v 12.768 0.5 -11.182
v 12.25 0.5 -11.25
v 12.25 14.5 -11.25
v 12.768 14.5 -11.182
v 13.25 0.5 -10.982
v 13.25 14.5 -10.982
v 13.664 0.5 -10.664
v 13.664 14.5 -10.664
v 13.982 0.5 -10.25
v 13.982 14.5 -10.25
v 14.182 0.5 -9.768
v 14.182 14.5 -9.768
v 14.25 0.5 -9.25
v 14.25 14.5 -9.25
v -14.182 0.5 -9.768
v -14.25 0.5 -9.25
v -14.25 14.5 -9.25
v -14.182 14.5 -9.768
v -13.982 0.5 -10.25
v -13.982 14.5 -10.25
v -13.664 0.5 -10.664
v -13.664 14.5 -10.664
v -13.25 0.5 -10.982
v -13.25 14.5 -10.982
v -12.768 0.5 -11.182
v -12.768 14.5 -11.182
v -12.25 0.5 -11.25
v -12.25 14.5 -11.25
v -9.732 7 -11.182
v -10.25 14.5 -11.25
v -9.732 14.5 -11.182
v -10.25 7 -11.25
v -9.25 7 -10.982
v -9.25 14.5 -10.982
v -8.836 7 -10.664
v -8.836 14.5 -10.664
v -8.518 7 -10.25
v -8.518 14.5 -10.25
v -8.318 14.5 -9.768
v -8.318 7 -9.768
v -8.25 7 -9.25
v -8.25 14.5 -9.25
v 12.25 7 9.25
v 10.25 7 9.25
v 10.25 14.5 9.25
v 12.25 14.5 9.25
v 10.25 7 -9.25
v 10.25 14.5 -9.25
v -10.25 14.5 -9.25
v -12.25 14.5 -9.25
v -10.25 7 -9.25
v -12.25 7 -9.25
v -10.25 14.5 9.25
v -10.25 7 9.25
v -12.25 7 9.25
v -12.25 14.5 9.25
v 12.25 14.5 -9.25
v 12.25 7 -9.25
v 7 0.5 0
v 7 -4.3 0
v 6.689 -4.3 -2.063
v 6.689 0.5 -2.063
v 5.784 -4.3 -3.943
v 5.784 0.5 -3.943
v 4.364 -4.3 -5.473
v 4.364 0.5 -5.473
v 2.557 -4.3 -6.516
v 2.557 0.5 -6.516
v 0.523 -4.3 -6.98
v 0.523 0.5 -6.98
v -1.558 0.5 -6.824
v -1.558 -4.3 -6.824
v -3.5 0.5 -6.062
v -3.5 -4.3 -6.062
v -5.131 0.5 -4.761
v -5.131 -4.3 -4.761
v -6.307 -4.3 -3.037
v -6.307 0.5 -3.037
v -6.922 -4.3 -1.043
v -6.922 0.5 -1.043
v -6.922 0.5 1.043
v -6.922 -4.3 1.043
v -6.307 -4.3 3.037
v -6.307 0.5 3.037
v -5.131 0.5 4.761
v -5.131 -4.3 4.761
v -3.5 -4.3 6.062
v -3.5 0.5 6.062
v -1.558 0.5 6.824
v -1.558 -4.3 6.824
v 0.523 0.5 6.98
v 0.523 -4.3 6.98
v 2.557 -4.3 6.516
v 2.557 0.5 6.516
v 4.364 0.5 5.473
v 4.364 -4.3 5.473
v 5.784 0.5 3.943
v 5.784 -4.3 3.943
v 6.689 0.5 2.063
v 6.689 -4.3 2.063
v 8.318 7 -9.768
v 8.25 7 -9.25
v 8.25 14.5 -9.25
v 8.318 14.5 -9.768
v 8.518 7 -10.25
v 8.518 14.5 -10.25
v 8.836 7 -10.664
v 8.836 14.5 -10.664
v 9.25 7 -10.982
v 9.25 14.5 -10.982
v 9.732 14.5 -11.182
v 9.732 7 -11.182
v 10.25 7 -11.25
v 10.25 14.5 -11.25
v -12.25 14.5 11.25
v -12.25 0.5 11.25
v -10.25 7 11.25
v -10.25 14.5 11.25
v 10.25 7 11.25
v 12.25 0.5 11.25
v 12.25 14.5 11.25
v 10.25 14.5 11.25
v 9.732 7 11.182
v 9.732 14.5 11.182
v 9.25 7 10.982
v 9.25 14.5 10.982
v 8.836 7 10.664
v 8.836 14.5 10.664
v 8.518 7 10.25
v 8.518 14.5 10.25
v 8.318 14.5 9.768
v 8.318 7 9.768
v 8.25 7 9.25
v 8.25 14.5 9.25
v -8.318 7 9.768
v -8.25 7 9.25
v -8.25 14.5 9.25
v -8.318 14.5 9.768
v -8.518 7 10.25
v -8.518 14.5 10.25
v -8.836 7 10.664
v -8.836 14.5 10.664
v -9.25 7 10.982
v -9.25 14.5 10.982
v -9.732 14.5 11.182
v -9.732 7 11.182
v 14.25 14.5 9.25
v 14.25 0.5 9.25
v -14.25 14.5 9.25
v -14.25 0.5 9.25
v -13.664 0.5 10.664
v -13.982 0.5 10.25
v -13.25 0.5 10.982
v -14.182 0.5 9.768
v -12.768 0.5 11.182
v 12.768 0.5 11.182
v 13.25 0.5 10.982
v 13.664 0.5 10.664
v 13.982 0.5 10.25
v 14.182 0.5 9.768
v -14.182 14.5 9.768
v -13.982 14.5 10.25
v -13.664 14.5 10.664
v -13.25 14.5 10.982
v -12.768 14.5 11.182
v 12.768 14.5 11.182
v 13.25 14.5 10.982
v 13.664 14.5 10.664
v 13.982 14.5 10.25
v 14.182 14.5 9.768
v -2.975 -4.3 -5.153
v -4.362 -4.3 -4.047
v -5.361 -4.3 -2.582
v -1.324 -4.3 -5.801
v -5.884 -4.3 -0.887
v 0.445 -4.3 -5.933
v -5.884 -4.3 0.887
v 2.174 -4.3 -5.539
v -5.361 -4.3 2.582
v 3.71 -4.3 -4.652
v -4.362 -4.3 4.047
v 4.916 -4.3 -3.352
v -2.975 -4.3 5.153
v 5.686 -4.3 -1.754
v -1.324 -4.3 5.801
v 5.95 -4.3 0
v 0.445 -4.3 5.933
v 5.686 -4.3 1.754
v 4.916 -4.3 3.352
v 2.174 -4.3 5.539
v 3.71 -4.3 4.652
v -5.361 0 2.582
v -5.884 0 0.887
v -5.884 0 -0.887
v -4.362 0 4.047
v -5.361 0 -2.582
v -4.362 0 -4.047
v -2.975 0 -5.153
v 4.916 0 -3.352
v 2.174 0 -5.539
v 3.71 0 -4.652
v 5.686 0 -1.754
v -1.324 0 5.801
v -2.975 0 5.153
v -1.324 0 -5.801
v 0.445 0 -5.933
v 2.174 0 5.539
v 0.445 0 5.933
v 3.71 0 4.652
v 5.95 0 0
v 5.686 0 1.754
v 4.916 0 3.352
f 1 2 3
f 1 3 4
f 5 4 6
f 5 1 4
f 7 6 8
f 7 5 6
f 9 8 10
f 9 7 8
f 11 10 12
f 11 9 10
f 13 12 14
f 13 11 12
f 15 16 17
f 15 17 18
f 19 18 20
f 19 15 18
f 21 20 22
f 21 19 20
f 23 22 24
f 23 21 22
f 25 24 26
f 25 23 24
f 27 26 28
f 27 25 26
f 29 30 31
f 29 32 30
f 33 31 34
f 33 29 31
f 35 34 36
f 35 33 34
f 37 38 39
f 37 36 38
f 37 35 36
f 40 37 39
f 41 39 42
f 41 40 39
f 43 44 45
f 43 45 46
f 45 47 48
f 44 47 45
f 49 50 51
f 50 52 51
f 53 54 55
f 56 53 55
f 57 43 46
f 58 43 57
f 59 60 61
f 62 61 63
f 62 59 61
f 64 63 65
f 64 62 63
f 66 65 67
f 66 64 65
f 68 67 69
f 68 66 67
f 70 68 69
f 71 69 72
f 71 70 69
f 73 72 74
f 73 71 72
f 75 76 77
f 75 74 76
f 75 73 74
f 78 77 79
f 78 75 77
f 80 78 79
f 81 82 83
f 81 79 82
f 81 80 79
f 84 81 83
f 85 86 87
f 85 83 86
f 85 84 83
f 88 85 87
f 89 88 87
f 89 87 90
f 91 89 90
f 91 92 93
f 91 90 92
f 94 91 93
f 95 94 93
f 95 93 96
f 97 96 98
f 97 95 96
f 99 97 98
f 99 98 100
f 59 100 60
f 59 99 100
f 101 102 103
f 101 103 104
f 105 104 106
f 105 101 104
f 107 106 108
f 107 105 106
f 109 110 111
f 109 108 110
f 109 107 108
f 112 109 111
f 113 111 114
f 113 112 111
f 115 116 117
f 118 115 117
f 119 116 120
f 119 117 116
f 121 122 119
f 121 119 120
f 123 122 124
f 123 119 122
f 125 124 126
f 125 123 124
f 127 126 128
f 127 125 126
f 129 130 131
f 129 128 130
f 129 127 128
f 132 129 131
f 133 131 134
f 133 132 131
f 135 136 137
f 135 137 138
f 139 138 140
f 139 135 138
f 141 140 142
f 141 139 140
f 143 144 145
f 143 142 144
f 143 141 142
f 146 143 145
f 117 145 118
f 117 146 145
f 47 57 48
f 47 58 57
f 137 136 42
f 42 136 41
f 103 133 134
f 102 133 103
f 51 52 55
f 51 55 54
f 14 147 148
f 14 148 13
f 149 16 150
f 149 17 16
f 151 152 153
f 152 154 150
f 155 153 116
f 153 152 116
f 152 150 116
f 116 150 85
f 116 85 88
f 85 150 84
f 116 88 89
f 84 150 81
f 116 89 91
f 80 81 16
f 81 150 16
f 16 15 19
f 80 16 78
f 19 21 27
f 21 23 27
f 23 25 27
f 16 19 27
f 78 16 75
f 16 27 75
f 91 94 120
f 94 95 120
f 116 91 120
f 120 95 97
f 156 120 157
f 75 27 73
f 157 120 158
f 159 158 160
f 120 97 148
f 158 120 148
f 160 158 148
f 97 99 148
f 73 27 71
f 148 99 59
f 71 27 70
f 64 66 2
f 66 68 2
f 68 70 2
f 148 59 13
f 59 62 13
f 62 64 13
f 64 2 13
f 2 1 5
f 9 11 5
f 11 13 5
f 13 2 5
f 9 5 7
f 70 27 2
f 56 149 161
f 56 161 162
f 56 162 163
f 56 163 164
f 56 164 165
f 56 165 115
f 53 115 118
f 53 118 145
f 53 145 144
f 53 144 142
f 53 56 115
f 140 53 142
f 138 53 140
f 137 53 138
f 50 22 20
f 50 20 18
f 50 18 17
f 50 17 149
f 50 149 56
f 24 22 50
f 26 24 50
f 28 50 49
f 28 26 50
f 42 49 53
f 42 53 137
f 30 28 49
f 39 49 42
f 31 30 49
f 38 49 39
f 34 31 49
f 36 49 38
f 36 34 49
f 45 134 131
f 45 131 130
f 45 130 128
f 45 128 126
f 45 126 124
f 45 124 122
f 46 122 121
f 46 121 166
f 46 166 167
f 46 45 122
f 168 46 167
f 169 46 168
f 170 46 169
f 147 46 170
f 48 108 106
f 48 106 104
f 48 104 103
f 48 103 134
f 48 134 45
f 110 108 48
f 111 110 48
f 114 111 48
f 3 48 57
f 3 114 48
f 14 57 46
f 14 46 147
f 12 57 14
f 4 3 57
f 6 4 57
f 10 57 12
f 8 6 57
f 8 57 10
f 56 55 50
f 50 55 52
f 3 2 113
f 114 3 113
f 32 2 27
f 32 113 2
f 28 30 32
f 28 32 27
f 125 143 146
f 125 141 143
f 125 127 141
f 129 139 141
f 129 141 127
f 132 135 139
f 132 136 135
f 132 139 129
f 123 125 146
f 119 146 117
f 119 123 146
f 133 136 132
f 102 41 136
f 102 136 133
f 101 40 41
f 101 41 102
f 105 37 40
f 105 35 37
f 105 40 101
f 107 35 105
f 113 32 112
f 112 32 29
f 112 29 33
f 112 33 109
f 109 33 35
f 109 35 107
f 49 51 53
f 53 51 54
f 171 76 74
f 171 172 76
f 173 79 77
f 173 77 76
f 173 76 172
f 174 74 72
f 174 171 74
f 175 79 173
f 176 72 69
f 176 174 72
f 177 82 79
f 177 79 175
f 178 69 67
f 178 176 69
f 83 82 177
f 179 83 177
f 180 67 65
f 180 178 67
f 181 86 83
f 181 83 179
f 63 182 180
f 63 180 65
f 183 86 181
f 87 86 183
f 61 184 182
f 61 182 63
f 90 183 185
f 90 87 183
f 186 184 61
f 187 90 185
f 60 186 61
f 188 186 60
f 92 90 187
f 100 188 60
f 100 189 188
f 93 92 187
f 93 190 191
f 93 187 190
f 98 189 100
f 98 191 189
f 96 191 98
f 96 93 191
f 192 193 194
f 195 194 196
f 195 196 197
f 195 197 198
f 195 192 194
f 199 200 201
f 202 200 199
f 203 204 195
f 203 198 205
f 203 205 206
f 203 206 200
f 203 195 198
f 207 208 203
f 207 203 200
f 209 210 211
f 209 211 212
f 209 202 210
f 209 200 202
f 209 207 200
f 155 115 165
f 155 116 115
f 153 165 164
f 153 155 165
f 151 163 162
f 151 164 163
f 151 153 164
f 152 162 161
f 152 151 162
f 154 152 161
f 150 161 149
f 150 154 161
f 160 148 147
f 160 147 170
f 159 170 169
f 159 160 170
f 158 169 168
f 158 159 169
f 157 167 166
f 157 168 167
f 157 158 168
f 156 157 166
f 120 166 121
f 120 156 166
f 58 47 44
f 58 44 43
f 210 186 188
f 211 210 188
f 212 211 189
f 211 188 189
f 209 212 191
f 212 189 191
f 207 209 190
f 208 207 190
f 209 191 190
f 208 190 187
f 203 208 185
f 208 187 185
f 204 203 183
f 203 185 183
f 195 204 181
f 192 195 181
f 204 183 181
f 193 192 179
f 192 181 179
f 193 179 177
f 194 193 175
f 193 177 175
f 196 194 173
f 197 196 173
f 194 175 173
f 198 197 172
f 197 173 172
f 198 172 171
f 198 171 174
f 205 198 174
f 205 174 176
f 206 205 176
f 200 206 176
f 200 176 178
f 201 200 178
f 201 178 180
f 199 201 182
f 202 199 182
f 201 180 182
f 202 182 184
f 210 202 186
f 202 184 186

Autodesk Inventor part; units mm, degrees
ref_plane "YZ Plane" through (0, 0, 0) normal (1, 0, 0) x (0, 1, 0)
ref_plane "XZ Plane" through (0, 0, 0) normal (0, 1, 0) x (-1, 0, 0)
ref_plane "XY Plane" through (0, 0, 0) normal (0, 0, 1) x (1, 0, 0)
sketch "Sketch1" plane through (0, 0, 0) normal (0, 0, 1) x (1, 0, 0)
  line L0 (0, 0) -> (7, 0)
  line L1 (7, 0) -> (7, 7)
  line L2 (7, 7) -> (0, 7)
  line L3 (0, 7) -> (0, 0)
  line L4 (7, 0) -> (5.95, 0)
  line L5 (5.95, 0) -> (5.95, -4.3)
  line L6 (5.95, -4.3) -> (7, -4.3)
  line L7 (7, -4.3) -> (7, 0)
  dimension "d0" = 7
  dimension "d1" = 7
  dimension "d2" = 1.05
  dimension "d3" = 4.3
revolve "Revolution1" add sketch "Sketch1" angle 360 about axis through (0, 7, 0) along (0, -1, 0)
sketch "Sketch2" plane through (0, 7, 0) normal (0, 1, 0) x (1, 0, 0)
  line L0 (-14.25, -11.25) -> (14.25, -11.25)
  line L1 (14.25, -11.25) -> (14.25, 11.25)
  line L2 (14.25, 11.25) -> (-14.25, 11.25)
  line L3 (-14.25, 11.25) -> (-14.25, -11.25)
  line L4 (-14.25, -11.25) -> (14.25, 11.25) construction
  line L5 (14.25, -11.25) -> (-14.25, 11.25) construction
  point P0 (0, 0)
  dimension "d5" = 28.5
  dimension "d6" = 22.5
extrude "Extrusion1" add sketch "Sketch2" against normal blind 6.5
fillet "Fillet1" radius 2 4 edges at (-14.25, 3.75, 11.25) (-14.25, 3.75, -11.25) (14.25, 3.75, 11.25) (14.25, 3.75, -11.25)
sketch "Sketch3" plane through (-12.25, 7, -11.25) normal (0, 1, 0) x (1, 0, 0)
  arc A0 (26.5, -2) -> (24.5, 0) centre (24.5, -2) ccw projected
  line L0 (24.5, 0) -> (0, 0) projected
  arc A1 (0, 0) -> (-2, -2) centre (0, -2) ccw projected
  line L1 (-2, -2) -> (-2, -20.5) projected
  arc A2 (-2, -20.5) -> (0, -22.5) centre (0, -20.5) ccw projected
  line L2 (0, -22.5) -> (24.5, -22.5) projected
  arc A3 (24.5, -22.5) -> (26.5, -20.5) centre (24.5, -20.5) ccw projected
  line L3 (26.5, -20.5) -> (26.5, -2) projected
  line L4 (24.5, 0) -> (0, 0) projected
  line L5 (0, -22.5) -> (2, -22.5)
  line L6 (4, -20.5) -> (4, -2)
  line L7 (2, 0) -> (0, 0)
  line L8 (-2, -2) -> (-2, -20.5)
  arc A4 (0, 0) -> (-2, -2) centre (0, -2) ccw
  arc A5 (4, -2) -> (2, 0) centre (2, -2) ccw
  arc A6 (-2, -20.5) -> (0, -22.5) centre (0, -20.5) ccw
  arc A7 (2, -22.5) -> (4, -20.5) centre (2, -20.5) ccw
  line L9 (12.25, 1.2488) -> (12.25, 2.7237)
  arc A8 (26.5, -2) -> (24.5, 0) centre (24.5, -2) ccw
  line L10 (26.5, -2) -> (26.5, -20.5)
  arc A9 (24.5, -22.5) -> (26.5, -20.5) centre (24.5, -20.5) ccw
  line L11 (24.5, -22.5) -> (22.5, -22.5)
  line L12 (20.5, -20.5) -> (20.5, -2)
  line L13 (22.5, 0) -> (24.5, 0)
  line L14 (26.5, -2) -> (26.5, -20.5)
  arc A10 (26.5, -2) -> (24.5, 0) centre (24.5, -2) ccw
  arc A11 (22.5, 0) -> (20.5, -2) centre (22.5, -2) ccw
  arc A12 (24.5, -22.5) -> (26.5, -20.5) centre (24.5, -20.5) ccw
  arc A13 (20.5, -20.5) -> (22.5, -22.5) centre (22.5, -20.5) ccw
  line L15 (2, -2) -> (2, -20.5)
  line L16 (2, -20.5) -> (0, -20.5)
  line L17 (0, -20.5) -> (0, -2)
  line L18 (0, -2) -> (2, -2)
  line L19 (22.5, -2) -> (22.5, -20.5)
  line L20 (22.5, -20.5) -> (24.5, -20.5)
  line L21 (24.5, -20.5) -> (24.5, -2)
  line L22 (24.5, -2) -> (22.5, -2)
  point P0 (12.25, -11.25)
  point P1 (4, 0)
  point P2 (-2, 0)
  point P3 (20.5, 0)
  point P4 (26.5, 0)
  point P5 (2, 0)
  point P6 (2, -22.5)
  dimension "d10" = 6
  dimension "d11" = 2
  dimension "d12" = 2
  dimension "d13" = 2
extrude "Extrusion2" add sketch "Sketch3" along normal blind 7.5 contours L3 A3 L2 A13 L12 A11 L0 A0 | A5 L6 A7 L2 A2 L1 A1 L0
properties part number "Keller"
